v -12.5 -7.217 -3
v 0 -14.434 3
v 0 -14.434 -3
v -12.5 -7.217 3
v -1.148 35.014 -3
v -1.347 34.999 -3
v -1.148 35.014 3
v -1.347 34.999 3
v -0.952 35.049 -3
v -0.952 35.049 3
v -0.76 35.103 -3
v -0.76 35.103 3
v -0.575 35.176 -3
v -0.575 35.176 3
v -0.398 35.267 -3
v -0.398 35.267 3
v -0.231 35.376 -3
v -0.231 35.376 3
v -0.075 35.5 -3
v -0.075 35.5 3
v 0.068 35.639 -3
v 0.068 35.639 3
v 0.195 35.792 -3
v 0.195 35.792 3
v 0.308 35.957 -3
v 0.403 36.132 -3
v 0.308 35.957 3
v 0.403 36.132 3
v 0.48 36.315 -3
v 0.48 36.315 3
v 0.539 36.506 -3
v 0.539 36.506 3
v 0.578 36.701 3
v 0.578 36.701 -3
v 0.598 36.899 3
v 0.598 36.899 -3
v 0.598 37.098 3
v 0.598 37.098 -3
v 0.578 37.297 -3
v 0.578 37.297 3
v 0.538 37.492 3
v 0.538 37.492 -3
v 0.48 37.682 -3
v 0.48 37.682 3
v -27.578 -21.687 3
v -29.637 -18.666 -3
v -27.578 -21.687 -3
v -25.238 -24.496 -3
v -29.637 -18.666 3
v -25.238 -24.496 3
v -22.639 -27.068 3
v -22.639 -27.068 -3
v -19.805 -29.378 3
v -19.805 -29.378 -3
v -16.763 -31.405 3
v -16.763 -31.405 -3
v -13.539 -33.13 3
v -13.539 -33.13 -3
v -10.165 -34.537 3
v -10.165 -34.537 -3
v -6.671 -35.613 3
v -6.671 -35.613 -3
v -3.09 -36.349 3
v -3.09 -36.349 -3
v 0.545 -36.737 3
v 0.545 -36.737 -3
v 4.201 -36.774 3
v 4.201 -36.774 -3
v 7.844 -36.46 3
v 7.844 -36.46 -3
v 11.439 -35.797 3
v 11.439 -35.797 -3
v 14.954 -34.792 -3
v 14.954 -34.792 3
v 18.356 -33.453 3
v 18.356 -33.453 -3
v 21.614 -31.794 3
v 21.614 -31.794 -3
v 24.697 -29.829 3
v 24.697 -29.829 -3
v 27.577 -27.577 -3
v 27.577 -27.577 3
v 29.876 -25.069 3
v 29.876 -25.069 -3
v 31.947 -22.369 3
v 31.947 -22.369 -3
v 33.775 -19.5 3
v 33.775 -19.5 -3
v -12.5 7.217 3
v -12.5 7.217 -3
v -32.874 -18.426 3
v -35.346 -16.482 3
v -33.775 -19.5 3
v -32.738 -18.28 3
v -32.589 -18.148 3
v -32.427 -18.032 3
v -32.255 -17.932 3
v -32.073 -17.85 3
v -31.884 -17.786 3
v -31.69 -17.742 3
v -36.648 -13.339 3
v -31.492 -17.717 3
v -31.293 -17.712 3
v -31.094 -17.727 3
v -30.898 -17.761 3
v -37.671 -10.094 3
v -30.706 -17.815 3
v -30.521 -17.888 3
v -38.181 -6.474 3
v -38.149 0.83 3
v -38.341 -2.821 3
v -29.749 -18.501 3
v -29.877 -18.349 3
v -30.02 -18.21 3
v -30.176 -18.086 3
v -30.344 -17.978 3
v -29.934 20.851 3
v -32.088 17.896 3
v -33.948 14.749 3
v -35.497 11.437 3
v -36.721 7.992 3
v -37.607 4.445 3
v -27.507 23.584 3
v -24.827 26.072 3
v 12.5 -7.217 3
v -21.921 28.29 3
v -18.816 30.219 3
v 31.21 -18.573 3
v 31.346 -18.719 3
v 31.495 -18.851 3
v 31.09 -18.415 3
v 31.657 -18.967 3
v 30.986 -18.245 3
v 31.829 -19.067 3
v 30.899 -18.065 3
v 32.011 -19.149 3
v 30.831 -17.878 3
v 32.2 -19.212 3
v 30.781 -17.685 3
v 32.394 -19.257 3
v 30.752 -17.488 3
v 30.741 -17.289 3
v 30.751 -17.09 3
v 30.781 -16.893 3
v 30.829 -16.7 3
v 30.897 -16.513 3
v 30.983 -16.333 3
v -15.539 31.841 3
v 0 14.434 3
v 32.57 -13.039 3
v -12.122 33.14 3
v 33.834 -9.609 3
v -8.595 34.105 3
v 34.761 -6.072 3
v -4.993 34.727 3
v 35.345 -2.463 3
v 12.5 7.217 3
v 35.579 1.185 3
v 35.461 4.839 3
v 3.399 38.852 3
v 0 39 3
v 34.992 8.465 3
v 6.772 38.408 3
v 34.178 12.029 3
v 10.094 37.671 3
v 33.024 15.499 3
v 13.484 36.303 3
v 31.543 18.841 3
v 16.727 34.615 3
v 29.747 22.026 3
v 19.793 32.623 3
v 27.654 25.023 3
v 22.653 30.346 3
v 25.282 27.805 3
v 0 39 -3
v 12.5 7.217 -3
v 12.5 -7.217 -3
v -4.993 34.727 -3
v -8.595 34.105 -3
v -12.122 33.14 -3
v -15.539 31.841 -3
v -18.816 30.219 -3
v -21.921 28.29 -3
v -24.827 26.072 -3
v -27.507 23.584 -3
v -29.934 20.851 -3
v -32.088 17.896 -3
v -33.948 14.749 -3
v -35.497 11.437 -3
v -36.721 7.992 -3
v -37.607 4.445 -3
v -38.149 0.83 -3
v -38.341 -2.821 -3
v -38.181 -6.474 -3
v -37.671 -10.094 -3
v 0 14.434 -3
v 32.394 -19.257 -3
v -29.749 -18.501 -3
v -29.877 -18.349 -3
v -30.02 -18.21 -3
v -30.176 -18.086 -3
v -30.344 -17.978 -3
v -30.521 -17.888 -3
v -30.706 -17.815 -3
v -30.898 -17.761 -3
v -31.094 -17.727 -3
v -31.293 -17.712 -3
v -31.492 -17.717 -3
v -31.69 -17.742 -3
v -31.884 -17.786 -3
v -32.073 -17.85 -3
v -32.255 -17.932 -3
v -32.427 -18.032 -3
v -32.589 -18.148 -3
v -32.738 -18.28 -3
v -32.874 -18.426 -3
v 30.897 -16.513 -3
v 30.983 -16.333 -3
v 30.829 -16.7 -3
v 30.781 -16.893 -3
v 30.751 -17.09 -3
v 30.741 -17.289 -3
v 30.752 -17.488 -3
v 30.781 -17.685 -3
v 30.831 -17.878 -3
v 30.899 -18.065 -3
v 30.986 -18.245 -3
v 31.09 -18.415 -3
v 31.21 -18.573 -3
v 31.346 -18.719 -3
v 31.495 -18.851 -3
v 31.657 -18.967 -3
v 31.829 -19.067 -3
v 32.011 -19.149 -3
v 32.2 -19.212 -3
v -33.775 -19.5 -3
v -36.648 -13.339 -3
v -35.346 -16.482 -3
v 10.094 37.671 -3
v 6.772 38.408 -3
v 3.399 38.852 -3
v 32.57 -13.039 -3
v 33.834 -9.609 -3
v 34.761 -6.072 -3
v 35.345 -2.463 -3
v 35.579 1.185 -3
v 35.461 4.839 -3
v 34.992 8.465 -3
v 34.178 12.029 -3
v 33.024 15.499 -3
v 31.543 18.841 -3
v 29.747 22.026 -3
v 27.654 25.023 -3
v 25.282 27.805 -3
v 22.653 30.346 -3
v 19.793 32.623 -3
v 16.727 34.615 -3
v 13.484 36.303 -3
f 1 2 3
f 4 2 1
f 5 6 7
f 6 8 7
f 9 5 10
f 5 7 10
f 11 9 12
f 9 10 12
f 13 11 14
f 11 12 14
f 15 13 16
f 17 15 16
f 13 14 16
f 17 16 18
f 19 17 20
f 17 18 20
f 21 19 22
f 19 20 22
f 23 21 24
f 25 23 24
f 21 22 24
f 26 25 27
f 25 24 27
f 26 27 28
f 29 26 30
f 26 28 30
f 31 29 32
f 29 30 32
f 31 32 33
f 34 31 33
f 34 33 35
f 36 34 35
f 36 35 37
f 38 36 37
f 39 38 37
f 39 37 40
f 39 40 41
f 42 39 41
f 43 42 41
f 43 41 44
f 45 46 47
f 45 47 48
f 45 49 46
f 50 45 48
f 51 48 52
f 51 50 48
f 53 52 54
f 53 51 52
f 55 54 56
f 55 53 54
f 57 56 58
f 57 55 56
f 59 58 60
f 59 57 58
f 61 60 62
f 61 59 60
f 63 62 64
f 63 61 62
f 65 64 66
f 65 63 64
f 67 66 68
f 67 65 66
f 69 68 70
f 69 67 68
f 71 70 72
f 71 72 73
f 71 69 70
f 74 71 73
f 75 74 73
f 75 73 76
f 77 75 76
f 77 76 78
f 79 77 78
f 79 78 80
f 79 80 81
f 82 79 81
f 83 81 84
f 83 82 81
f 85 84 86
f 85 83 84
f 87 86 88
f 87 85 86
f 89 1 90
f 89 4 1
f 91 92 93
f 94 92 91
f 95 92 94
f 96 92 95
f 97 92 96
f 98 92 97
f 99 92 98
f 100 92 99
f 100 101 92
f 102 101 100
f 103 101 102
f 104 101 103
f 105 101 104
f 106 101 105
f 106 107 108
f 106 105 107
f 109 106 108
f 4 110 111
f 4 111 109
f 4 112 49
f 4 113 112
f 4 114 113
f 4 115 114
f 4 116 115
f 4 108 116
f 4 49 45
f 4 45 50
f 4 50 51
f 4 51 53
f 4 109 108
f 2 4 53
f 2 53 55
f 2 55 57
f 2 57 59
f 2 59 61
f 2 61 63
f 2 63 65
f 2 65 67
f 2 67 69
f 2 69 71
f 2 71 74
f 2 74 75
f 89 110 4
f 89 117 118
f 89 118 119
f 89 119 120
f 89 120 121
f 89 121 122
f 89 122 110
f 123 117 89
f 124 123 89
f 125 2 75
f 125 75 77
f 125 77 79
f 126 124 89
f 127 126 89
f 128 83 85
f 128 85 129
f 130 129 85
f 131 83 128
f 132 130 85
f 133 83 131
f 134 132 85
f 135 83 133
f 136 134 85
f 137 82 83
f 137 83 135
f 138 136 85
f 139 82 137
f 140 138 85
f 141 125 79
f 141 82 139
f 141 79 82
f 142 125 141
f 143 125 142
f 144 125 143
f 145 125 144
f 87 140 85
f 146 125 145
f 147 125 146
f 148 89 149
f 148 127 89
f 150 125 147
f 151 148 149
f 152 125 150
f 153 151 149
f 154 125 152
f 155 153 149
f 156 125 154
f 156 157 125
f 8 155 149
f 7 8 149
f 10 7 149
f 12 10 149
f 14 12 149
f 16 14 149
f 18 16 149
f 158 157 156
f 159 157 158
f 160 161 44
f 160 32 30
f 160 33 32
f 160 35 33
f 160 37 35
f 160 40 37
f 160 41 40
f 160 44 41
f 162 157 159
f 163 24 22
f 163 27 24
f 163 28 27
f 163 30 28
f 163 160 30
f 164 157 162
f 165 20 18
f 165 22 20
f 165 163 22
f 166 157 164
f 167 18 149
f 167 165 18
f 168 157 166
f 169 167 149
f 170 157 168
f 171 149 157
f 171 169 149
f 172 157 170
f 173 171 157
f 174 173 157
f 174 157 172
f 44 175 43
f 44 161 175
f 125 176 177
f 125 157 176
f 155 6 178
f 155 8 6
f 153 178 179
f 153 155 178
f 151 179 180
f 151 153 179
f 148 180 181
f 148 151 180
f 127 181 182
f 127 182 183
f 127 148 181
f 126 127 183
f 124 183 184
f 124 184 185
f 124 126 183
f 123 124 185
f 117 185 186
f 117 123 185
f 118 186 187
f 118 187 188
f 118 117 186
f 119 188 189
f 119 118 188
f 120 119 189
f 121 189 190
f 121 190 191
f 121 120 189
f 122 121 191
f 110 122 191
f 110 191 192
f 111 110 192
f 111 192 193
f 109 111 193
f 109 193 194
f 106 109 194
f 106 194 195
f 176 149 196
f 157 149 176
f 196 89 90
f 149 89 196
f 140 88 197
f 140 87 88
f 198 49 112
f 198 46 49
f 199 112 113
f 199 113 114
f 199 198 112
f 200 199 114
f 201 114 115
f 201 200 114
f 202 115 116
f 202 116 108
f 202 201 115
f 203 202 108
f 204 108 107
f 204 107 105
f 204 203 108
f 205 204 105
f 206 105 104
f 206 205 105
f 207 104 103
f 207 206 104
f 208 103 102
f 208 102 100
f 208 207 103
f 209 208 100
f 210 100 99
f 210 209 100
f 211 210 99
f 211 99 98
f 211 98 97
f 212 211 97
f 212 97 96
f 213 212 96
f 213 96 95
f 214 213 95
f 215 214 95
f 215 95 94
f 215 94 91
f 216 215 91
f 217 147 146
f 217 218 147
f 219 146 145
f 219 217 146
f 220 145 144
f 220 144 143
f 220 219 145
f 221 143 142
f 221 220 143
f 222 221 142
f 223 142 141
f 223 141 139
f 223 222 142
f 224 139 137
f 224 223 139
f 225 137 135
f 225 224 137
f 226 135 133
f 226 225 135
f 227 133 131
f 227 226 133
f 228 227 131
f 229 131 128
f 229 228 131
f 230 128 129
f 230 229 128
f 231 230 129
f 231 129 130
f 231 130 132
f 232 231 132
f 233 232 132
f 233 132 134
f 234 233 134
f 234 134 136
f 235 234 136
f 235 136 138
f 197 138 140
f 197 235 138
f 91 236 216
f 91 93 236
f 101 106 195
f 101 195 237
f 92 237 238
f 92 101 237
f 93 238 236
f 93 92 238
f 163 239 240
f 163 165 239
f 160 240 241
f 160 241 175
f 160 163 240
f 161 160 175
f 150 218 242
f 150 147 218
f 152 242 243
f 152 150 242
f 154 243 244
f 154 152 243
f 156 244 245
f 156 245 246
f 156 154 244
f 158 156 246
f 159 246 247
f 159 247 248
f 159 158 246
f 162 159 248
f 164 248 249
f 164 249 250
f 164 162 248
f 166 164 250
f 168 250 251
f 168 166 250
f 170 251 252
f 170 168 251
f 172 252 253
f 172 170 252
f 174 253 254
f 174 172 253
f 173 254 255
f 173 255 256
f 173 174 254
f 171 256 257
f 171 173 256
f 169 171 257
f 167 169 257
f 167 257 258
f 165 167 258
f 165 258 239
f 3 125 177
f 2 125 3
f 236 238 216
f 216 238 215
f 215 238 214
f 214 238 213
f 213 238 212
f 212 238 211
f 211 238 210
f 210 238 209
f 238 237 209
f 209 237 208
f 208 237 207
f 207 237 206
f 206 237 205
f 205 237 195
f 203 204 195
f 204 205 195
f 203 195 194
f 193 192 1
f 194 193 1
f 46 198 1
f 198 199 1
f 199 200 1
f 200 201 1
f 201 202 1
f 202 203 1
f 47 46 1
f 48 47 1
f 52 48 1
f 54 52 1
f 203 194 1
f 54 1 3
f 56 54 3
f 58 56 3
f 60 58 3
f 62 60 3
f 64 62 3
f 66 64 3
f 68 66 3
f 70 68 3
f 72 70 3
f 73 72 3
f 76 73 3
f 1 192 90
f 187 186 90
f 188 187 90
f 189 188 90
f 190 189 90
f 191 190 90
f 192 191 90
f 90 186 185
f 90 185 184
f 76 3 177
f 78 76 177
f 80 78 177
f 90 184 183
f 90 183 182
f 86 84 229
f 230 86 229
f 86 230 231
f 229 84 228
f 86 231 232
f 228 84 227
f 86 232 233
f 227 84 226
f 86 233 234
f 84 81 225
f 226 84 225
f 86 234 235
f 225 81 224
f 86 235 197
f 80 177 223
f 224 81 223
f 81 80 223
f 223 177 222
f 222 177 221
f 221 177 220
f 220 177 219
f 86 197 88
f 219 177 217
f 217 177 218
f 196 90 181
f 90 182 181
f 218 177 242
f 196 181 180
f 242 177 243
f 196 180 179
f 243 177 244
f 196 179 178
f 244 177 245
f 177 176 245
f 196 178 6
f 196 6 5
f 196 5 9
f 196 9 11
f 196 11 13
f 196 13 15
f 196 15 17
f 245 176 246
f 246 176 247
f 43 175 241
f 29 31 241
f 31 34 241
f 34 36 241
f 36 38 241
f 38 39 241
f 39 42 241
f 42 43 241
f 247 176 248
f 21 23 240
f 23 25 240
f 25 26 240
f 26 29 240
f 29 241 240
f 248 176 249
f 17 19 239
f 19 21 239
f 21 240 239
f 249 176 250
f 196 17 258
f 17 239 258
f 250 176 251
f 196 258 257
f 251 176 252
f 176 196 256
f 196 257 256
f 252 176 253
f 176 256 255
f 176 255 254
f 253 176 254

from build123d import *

# Parameters (mm, degrees)
BOSS_EXTRUDE1_DEPTH = 3
FILLET1_R           = 2


with BuildPart() as part:
    # Sketch1 → Boss-Extrude1 (new, symmetric)
    with BuildSketch(Plane.XY):
        with BuildLine():
            ThreePointArc((10.093942759, 37.671107225), (5.090521497, 38.666349594), (0, 39))
            Line((0, 39), (1.467076979, 34.969239127))
            ThreePointArc((1.467076979, 34.969239127), (-29.031358559, 21.929979589), (-37.671107225, -10.093942759))
            ThreePointArc((-37.671107225, -10.093942759), (-36.031301768, -14.924653862), (-33.774990748, -19.5))
            Line((-33.774990748, -19.5), (-31.017787925, -16.21409363))
            ThreePointArc((-31.017787925, -16.21409363), (-4.476240149, -36.106883814), (27.577164466, -27.577164466))
            ThreePointArc((27.577164466, -27.577164466), (30.940780271, -23.741695731), (33.774990748, -19.5))
            Line((33.774990748, -19.5), (29.550710946, -18.755145497))
            ThreePointArc((29.550710946, -18.755145497), (33.507598709, 14.176904224), (10.093942759, 37.671107225))
        make_face()
        Polygon((-12.5, 7.216878365), (0, 14.43375673), (12.5, 7.216878365), (12.5, -7.216878365), (0, -14.43375673), (-12.5, -7.216878365), align=None, mode=Mode.SUBTRACT)
    extrude(amount=BOSS_EXTRUDE1_DEPTH, both=True)

    # Fillet1
    fillet1_edges = [part.edges().sort_by_distance(p)[0] for p in [
        (1.467076979, 34.969239127, 0),
        (29.550710946, -18.755145497, 0),
        (-31.017787925, -16.21409363, 0),
    ]]
    fillet(fillet1_edges, radius=FILLET1_R)


solid = part.part
